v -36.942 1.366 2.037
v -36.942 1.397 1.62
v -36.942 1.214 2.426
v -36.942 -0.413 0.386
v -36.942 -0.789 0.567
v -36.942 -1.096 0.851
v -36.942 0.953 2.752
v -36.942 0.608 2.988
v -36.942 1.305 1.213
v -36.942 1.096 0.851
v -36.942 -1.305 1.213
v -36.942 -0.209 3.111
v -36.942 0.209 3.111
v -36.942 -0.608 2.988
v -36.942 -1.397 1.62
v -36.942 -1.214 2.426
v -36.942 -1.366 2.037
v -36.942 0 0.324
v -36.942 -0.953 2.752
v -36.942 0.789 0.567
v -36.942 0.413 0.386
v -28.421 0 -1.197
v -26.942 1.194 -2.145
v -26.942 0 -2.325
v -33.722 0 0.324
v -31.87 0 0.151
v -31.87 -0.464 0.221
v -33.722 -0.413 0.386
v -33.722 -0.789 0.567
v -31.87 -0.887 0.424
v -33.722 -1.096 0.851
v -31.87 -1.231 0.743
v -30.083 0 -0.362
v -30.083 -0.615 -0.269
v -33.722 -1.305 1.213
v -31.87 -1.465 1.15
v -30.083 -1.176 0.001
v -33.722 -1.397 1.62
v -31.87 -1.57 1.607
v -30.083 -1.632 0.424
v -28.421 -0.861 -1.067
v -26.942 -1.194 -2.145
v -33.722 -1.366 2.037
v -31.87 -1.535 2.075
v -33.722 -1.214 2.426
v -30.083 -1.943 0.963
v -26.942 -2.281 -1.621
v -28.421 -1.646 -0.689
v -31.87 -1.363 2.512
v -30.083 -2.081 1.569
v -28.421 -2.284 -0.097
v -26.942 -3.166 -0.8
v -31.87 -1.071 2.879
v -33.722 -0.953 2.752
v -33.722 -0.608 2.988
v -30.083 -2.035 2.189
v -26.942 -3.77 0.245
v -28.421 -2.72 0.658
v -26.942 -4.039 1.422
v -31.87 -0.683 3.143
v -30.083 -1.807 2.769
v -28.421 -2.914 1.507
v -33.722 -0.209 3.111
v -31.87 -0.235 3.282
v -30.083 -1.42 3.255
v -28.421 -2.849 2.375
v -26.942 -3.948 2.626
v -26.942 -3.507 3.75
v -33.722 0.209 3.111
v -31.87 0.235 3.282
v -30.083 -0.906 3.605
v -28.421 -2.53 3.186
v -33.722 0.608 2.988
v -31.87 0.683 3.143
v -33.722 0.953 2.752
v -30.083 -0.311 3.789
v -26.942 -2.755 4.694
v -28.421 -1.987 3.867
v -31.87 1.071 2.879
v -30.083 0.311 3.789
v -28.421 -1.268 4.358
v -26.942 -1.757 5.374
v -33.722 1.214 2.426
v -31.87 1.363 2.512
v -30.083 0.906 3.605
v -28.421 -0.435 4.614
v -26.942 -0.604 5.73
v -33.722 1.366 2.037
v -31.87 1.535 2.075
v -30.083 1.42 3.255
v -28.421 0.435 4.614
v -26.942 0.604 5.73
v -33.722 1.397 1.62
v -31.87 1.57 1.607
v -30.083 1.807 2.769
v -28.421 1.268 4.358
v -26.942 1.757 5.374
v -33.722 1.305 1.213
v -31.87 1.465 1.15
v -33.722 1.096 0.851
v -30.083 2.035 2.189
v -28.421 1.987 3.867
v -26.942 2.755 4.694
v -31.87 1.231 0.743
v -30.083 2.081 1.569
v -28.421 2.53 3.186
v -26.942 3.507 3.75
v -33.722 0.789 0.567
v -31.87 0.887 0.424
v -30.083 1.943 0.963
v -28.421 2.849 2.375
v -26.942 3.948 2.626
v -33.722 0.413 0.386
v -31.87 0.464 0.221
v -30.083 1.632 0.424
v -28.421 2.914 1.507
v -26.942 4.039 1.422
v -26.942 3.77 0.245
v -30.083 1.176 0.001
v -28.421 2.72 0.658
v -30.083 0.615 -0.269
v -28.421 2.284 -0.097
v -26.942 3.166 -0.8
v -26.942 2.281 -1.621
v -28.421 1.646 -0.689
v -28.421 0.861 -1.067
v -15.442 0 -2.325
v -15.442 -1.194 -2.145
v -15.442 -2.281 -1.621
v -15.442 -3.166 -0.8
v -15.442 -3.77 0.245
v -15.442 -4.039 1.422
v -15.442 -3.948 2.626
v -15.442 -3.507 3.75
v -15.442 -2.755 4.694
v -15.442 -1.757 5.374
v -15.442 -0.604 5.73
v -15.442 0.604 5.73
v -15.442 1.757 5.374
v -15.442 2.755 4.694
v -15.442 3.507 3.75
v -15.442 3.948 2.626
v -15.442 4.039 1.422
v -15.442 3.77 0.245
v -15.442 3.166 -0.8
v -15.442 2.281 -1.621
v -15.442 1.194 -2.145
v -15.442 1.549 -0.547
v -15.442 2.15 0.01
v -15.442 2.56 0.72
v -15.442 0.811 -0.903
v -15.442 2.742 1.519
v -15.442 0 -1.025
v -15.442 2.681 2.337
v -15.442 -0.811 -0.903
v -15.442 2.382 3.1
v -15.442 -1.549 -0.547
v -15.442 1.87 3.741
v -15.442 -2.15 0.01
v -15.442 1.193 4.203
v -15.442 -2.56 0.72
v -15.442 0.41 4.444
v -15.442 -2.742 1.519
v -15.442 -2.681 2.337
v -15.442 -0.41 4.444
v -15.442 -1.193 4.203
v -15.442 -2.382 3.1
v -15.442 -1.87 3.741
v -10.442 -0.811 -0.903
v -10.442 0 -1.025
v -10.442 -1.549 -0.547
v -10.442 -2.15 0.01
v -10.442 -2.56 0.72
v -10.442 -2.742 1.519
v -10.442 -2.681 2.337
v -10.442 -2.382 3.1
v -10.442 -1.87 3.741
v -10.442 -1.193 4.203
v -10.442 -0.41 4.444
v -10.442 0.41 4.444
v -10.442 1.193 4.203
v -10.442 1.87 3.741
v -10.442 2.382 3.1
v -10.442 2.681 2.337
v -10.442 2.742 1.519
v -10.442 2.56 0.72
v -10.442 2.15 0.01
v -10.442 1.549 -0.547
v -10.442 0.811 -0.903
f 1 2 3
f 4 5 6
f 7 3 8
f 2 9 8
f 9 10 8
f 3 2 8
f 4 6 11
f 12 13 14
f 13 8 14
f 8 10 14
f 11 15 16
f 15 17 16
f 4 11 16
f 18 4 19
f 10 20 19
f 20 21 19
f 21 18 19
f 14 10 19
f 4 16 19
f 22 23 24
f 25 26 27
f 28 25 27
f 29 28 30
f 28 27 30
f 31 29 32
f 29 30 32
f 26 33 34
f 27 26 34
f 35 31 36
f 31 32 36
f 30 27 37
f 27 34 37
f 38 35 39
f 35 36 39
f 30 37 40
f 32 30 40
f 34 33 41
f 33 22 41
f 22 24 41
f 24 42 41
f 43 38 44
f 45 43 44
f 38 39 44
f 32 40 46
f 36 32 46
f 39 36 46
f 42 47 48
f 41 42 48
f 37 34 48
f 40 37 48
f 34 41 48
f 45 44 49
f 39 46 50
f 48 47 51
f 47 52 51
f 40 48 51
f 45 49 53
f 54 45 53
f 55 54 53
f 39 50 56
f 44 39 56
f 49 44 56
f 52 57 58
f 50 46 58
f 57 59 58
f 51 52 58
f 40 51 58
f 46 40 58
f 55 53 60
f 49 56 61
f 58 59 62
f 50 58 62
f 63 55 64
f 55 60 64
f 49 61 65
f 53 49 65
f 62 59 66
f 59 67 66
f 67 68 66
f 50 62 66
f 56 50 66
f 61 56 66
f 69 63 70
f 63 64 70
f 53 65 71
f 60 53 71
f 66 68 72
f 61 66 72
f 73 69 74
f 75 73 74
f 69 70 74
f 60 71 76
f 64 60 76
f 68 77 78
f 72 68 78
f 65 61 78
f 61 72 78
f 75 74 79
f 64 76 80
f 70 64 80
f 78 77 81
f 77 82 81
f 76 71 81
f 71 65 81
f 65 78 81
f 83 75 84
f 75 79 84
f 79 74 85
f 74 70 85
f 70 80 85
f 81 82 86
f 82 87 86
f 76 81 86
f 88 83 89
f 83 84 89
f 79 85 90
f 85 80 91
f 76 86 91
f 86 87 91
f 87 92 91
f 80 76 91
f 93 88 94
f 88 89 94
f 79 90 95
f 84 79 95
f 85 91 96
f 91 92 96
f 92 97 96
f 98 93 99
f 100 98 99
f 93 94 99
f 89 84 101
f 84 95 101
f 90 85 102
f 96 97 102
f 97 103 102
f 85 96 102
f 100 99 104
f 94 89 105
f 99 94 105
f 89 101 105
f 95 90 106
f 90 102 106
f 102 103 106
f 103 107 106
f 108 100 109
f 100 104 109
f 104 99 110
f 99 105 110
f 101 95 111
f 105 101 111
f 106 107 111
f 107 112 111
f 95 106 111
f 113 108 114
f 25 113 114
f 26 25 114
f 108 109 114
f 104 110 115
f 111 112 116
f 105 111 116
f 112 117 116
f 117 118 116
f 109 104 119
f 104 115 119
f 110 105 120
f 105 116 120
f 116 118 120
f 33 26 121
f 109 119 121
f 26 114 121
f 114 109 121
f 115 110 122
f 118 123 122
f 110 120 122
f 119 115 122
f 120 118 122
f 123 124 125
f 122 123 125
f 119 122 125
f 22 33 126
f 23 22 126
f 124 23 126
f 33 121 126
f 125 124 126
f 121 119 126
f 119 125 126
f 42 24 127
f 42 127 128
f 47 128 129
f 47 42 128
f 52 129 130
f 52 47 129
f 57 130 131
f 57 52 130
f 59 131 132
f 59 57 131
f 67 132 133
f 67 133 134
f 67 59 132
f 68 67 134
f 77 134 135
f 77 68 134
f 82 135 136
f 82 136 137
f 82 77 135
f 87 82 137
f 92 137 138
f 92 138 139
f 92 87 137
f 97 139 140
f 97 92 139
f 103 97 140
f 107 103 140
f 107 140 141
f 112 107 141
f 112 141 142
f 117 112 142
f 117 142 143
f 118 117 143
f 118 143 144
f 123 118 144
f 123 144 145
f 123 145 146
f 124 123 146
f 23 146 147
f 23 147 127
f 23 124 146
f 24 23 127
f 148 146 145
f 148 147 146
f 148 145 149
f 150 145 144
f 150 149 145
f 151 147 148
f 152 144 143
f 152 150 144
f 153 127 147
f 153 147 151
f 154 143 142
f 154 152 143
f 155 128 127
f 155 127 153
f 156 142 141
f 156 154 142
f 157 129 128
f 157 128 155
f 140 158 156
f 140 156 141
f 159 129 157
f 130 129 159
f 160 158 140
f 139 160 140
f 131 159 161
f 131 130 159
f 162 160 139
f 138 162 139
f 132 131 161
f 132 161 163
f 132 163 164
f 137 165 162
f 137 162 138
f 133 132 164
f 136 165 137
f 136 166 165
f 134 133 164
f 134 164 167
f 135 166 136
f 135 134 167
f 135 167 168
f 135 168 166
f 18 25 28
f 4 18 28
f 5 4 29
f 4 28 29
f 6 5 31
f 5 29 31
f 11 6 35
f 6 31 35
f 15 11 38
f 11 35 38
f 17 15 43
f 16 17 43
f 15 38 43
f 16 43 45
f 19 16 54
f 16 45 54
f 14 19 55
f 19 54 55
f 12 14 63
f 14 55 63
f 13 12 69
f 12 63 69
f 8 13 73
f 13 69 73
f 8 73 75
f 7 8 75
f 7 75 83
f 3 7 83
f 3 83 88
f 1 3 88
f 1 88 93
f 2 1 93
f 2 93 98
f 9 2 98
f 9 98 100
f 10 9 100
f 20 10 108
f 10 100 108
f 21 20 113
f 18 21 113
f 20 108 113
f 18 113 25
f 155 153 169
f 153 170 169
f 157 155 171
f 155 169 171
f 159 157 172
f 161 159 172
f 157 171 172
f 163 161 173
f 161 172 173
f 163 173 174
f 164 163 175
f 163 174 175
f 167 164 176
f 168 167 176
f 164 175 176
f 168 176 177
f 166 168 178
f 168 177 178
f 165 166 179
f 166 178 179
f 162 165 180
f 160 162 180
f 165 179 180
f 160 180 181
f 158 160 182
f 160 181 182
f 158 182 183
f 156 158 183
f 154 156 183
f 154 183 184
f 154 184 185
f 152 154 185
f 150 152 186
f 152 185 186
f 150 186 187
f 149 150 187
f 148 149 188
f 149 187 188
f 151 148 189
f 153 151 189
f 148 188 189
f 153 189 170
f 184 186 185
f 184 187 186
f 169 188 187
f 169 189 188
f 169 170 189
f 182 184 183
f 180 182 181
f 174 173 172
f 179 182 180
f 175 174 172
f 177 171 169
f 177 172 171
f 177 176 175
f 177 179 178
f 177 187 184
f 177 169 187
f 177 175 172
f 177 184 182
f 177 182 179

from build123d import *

# Parameters (mm, degrees)
SKETCH_1_W   = 5
SKETCH_1_H   = 2.75
SKETCH_1_3_W = 10
SKETCH_1_3_H = 1.401405784
FILLET_1_R   = 10


with BuildPart() as part:
    # 草图1 → 旋转1 (revolve)
    with BuildSketch(Plane(origin=(0, 0, 0), x_dir=(1, 0, 0), z_dir=(0, 1, 0))):
        Polygon((-26.94244556, -1.725), (-15.44244556, -1.725), (-15.44244556, 1.025), (-15.44244556, 2.325), (-26.94244556, 2.325), (-26.94244556, -0.323594216), align=None)
        with Locations((-12.94244556, -0.35)):
            Rectangle(SKETCH_1_W, SKETCH_1_H)
    revolve(axis=Axis((-10.44244556, 0, 1.725), (-1, 0, 0)))

    # 草图1<3> → 旋转2 (revolve)
    with BuildSketch(Plane(origin=(0, 0, 0), x_dir=(1, 0, 0), z_dir=(0, 1, 0))):
        with Locations((-31.94244556, -1.024297108)):
            Rectangle(SKETCH_1_3_W, SKETCH_1_3_H)
    revolve(axis=Axis((-10.44244556, 0, 1.725), (-1, 0, 0)))

    # 圆角1
    # the kernel refuses this fillet: 10 mm, written as the material it adds along each edge
    with BuildSketch(Plane(origin=(-26.94244556, 0, 1.725), x_dir=(0, 0, -1), z_dir=(0, 1, 0))) as fillet_1_piece_1:
        with BuildLine():
            CenterArc((11.401405784, 6.779146923), FILLET_1_R, 180, 42.680903871)
            Line((1.401405784, 6.779146923), (1.201405784, 6.779146923))
            Line((1.201405784, 6.779146923), (1.201405784, 0))
            Line((1.201405784, 0), (1.401405784, -0.2))
            ThreePointArc((1.401405784, -0.2), (2.725702892, -0.2), (3.902971884, -0.135582938))
            Line((3.902971884, -0.135582938), (4.05, 0))
        make_face()
    revolve(axis=Axis((-26.94244556, 0, 1.725), (-1, 0, 0)))


solid = part.part
